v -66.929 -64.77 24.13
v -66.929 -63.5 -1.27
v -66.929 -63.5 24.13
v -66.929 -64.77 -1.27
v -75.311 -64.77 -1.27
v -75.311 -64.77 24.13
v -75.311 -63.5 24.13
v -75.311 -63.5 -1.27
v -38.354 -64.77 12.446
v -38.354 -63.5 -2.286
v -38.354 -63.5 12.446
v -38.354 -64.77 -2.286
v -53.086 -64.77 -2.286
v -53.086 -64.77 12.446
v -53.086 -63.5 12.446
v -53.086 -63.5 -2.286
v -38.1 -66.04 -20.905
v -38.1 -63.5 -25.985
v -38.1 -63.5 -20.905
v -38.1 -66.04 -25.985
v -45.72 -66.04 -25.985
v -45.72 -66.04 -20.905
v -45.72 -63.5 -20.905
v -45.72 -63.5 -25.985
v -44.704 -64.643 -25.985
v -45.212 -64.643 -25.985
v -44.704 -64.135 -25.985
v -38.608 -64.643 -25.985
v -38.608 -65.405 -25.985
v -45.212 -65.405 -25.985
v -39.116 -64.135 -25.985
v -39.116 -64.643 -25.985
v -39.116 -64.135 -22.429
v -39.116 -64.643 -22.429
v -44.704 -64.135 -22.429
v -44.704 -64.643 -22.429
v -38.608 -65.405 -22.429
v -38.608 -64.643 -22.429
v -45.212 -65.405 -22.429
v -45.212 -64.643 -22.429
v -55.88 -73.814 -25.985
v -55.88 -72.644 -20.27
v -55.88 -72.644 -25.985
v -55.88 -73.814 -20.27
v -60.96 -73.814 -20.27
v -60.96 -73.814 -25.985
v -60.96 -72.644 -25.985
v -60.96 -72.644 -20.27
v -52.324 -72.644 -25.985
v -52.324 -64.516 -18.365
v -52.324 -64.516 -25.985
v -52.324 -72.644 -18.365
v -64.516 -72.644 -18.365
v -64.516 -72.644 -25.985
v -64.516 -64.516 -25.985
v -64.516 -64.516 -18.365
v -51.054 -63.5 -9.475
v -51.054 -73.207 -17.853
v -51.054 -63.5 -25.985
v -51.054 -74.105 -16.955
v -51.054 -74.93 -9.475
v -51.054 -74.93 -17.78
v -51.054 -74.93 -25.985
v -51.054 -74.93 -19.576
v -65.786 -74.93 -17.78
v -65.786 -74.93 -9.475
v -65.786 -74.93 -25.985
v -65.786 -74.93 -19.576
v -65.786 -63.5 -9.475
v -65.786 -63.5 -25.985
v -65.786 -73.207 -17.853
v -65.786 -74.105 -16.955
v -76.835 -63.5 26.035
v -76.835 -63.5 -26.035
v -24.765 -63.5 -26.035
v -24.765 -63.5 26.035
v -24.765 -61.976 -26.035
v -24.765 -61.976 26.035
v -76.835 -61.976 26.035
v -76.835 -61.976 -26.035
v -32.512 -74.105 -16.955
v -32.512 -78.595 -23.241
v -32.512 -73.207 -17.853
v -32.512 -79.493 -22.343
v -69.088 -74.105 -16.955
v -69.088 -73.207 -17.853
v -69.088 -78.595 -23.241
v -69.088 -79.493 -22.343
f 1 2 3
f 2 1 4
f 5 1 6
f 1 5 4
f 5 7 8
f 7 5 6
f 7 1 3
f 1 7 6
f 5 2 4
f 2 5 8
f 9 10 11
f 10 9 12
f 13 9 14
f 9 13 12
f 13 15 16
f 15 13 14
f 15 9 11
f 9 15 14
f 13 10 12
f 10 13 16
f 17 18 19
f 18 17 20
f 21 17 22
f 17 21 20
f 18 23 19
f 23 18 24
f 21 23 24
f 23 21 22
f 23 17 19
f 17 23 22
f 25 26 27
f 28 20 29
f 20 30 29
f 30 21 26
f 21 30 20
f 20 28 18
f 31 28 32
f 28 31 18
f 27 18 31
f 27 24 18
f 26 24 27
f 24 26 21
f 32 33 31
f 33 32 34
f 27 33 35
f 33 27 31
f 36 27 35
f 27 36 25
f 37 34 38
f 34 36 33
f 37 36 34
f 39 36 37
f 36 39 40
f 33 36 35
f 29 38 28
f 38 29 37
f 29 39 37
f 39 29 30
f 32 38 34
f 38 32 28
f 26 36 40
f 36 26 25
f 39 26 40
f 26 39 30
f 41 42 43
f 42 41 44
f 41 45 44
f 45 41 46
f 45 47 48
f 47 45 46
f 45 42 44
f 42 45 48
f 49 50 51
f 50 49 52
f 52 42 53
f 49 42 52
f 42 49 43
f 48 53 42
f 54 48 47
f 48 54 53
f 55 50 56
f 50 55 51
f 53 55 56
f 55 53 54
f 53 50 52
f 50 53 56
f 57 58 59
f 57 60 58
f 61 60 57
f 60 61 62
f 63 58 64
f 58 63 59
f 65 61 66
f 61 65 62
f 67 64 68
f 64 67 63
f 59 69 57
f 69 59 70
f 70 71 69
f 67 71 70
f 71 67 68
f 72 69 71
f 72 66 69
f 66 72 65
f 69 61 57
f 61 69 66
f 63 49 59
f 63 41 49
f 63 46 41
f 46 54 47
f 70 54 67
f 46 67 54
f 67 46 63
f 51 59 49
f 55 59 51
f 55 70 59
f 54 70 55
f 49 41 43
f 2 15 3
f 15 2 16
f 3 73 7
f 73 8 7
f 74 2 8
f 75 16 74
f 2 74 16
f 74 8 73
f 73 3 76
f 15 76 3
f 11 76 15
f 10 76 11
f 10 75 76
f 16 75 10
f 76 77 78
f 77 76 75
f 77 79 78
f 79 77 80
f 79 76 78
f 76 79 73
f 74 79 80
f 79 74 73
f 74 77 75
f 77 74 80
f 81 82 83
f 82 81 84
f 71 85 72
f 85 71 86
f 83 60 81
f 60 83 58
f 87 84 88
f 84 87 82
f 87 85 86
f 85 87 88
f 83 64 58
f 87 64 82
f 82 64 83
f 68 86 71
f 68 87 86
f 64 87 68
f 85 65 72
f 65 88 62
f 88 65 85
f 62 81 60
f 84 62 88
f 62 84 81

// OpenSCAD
// file: ../mocad/moRJ45SocketSmall.scad
include <../mo/mo.scad>

moRJ45SocketSmall_Height = 0.65 * in;
moRJ45SocketSmall_Width = 0.58 * in;
moRJ45SocketSmall_Depth = 0.45 * in;
moRJ45SocketSmall_SideWall = 0.05 * in;
moRJ45SocketSmall_BottomWall = 0.05 * in;
moRJ45SocketSmall_TopWall = 0.08 * in;
moRJ45SocketSmall_BackWall = 0.35 * in;
moRJ45SocketSmall_TabHeight = 0.6 * in;
moRJ45SocketSmall_TabDepth = 0.05* in;
moRJ45SocketSmall_TabWidth = 0.2 * in;

positions = [ 
  [ [ 0, 0, 0 ], [ 0, 0, 1 ], 0 ],
  [ [ 0, -moRJ45SocketSmall_Height/2, -moRJ45SocketSmall_Depth/2 ], [ 1, 0, 0 ], 0 ]
];

module moRJ45SocketSmall( p = 0, info = false ) {
  moPresent( positions, p, info ) {
     color( Aluminum ) {
      difference() {
        cube( [ moRJ45SocketSmall_Width, moRJ45SocketSmall_Height, moRJ45SocketSmall_Depth ], center = true );
        translate( [ 0, -moRJ45SocketSmall_BackWall, -moRJ45SocketSmall_BottomWall/2 ] ) {
          translate( [ 0, -0.05*in, moRJ45SocketSmall_Depth / 2 - moRJ45SocketSmall_TopWall / 2 - Epsilon ] )
              cube( [ moRJ45SocketSmall_TabWidth, 
                      moRJ45SocketSmall_TabHeight, 
                      moRJ45SocketSmall_TabDepth ], center = true );
          cube( [ moRJ45SocketSmall_Width - 2 * moRJ45SocketSmall_SideWall, 
                  moRJ45SocketSmall_Height, 
                  moRJ45SocketSmall_Depth - moRJ45SocketSmall_TopWall - moRJ45SocketSmall_BottomWall ], center = true );
        }
        }
      }
    
  }
}


function moRJ45SocketSmallPosition( p = 0 ) = positions[ p ];

moMoveOriginTo( moRJ45SocketSmallPosition( 0 ) ) {
  moRJ45SocketSmall( 0, info = true, $name = true );
}
// file: ../mocad/moMicroUSB.scad
include <../mo/mo.scad>

moMicroUSB_Height = 0.2 * in;
moMicroUSB_Width = 0.3 * in;
moMicroUSB_Depth = 0.1 * in;
moMicroUSB_Wall = 0.02 * in;

positions = [ 
  [ [ 0, 0, 0 ], [ 0, 0, 1 ], 0 ],
  [ [ 0, -moMicroUSB_Height/2, -moMicroUSB_Depth/2 ], [ 1, 0, 0 ], 0 ]
];

module moMicroUSB( p = 0, info = false, name = false ) {
  moPresent( positions, p, info ) {
    // USB Connector
      color( Aluminum ) {
        difference() {
          cube( [ moMicroUSB_Width, moMicroUSB_Height, moMicroUSB_Depth ], center = true );
          translate( [ 0, -2 * moMicroUSB_Wall, -moMicroUSB_Wall/ 2] )
            cube( [ moMicroUSB_Width - 4 * moMicroUSB_Wall, 
                  moMicroUSB_Height - 2 * moMicroUSB_Wall, 
                  ( moMicroUSB_Depth - 2 * moMicroUSB_Wall ) / 2 ], center = true );
          translate( [ 0, -2 * moMicroUSB_Wall, moMicroUSB_Wall / 2 ] )
            cube( [ moMicroUSB_Width - 2 * moMicroUSB_Wall, 
                  moMicroUSB_Height - 2 * moMicroUSB_Wall, 
                  ( moMicroUSB_Depth - 2 * moMicroUSB_Wall ) / 2 ], center = true );
        
        }
      }
    
  }
}


function moMicroUSBPosition( p = 0 ) = positions[ p ];

moMoveOriginTo(moMicroUSBPosition( 1 ) ) {
  moMicroUSB( 1, info = true, $name = true );
}
// file: ../mocad/moPCB.scad
include <../mo/mo.scad>

PCBColor = [ 0, 0.3, 0 ];
PCBThickness = 0.06 * in;
PCBWidth = 1.5 * in;
PCBHeight = 1 * in;
PCBSpacing = 0.1 * in;
PCBMoldingLength = 0.45 * in;

module moPCB( width = PCBWidth, height = PCBHeight, color = PCBColor, thickness = PCBThickness, info = false ) {
  moPitch(-1)
  color( color ) {
    linear_extrude( height = thickness, twist = 0 ) {
      difference() {
        square( [ width, height ], center = true );
        children();
      }
    }
  }
  if ( info ) {
    moPartOrigin();
    for ( i = [ 0 : 5 ] )
      moMoveTo( moPCBPosition( i, width, height, thickness ) )
        moPosition( i );
  }
  if ( $name )
    moPartLabel( parent_module( 1 ) );
}

moPCBPositions = [
  [ [ 0, 0, 0 ], [ 0, 0, 1 ], 0 ],
  [ [ 0, 1, 0 ], [ 0, 0, 1 ], 180 ],
  [ [ 0.5, 0.5, 0 ], [ 0, 0, 1 ], 90 ],
  [ [ -0.5, 0.5, 0 ], [ 0, 0, 1 ], -90 ],
  [ [ 0, 0.5, 0.5 ], [ 1, 0, 0 ], -90 ],
  [ [ 0, 0.5, -0.5 ], [ 1, 0, 0 ], 90 ],
];

function vs( a, b ) = [ a[0]*b[0], a[1]*b[1], a[2]*b[2] ];

function moPCBPosition( p = 0, width = PCBWidth, height = PCBHeight, thickness = PCBThickness ) = [
  vs( moPCBPositions[ p ][ 0 ], [ width, thickness, height ] ),
  moPCBPositions[ p ][ 1 ], 
  moPCBPositions[ p ][ 2 ] 
];

module moPCBSIPMolding( x = 10, spacing = PCBSpacing, length = PCBMoldingLength, thickness = PCBSpacing/2, info = false ) {
  shift = length / 2;
  color( Black )
    translate( [ 0, length/2, 0 ] )
      cube( [ x * spacing, length, thickness ], center = true );
  if ( info ) {
    moPartOrigin();
    for ( i = [ 0 : 5 ] )
      moMoveTo( moPCBSIPMoldingPosition( i, x, spacing, length, thickness ) )
        moPosition( i );
  }
  if ( $name )
    moPartLabel( parent_module( 1 ) );
}

function moPCBSIPMoldingPosition( p = 0, x = 10, spacing = PCBSpacing, length = PCBMoldingLength, thickness = PCBSpacing / 2 ) = 
[
  vs( moPCBPositions[ p ][ 0 ], [ x * spacing, length, thickness ] ),
  moPCBPositions[ p ][ 1 ], 
  moPCBPositions[ p ][ 2 ] 
];

module moPCBPins( x = 10, spacing = 0.1 * in, diameter = 0.02 * in, length = 0.3 * in, ascent = 0.025 * in, info = false, center = true ) {
  shift = length / 2 - ascent;
  moPitch() {
    for ( xi = [ 0 : x - 1 ] ) {      
      translate( [ ( xi - (( center ) ? x / 2 - 0.5 : 0 ) ) * spacing, 0, 0  ] ) {
        translate( [ 0, 0, -shift ] ) {
          color( Copper )
            moYaw( 0.5 )
              cylinder( h = length, d = diameter, center = true, $fn = 4 );        
        }
      if ( info )
        moPitch( - 1 ) moPosition( xi );
      }
    }
  }
  if ( info )
    moPartOrigin();
  if ( $name )
    moPartLabel( parent_module( 1 ) );
}

function moPCBPinsPosition( x, xSize = 10, spacing = 0.1, center = true ) = [ ( x - (( center ) ? x / 2 - 0.5 : 0 ) ) * spacing, 0 ];

module moPCBHoles( x = 10, spacing = 0.1 * in, drill = 0.02 * in, info = false, center = true ) {
  for ( xi = [ 0 : x - 1 ] ) {      
    translate( [ ( xi - (( center ) ? x / 2 - 0.5 : 0 ) ) * spacing, 0 ] ) {
      circle( d = drill, center = true );        
      if ( info )
        moPitch( - 1 ) moPosition( xi );
    }
  }
  if ( info )
    moPartOrigin();
  if ( $name )
    moPartLabel( parent_module( 1 ) );
}

function moPCBHolesPosition( x, xSize = 10, spacing = 0.1, center = true ) = [ ( x - (( center ) ? x / 2 - 0.5 : 0 ) ) * spacing, 0 ];


module moPCBHoleGrid( x = 10, y = 10, spacing = 0.1 * in, drill = 0.02 * in, info = false, center = true ) {
  c = ( center ) ? [ x / 2 - 0.5, y / 2 - 0.5] : [ 0, 0 ];
  for ( yi = [ 0 : y - 1 ] ) {
    for ( xi = [ 0 : x - 1 ] ) {      
      translate( [ ( xi - c[ 0 ] ) * spacing, ( yi - c[ 1 ] ) * spacing  ], 0 ) {
        circle( d = drill, center = true );        
        if ( info )
          moPitch( - 1 ) moPosition2( [ xi, yi ] );
      }
    }
  }
  if ( info )
    moPartOrigin();
  if ( $name )
    moPartLabel( parent_module( 1 ) );
}

function moPCBHoleGrid( x, xSize = 10, ySize = 10, spacing = 0.1, center = true ) = 
  [ ( x - (( center ) ? x / 2 - 0.5 : 0 ) ) * spacing, ( y - (( center ) ? y / 2 - 0.5 : 0 ) ) * spacing ];


//moMoveOriginTo( moGridPosition( [ 2, 2, ] ) )

translate( [ -6 * in, 0, 0 ] ) {
  moPCB( 1.5 * in, 1 * in, info = true, $name = true )
    moPCBHoles( 10, 0.1 * in, 0.04 * in );
  moPCBPins( 10, 0.1 * in, length = 0.6 * in );
  moMoveTo( moPCBPosition( 1  ) )
    moFlip()
      moPCBSIPMolding( 10, length = 0.44 * in );
}
translate( [ -4 * in, 0, 0 ] )
   moPCBSIPMolding( 10, 0.1 * in, 0.5 * in, 0.05 * in, info = true, $name = true );
translate( [ -2 * in, 0, 0 ] )
   moPCBPins( 10, 0.1 * in, 0.02 * in, info = true, $name = true );
translate( [ 0 * in, 0, 0 ] )
  moPCBHoles( 10, info = true, $name = true );
translate( [ 2 * in, 0, 0 ] )
moPCBHoleGrid( 10, 10, info = true, $name = true );
// file: tpWR703N.scad
include <../mo/mo.scad>
use<../mocad/moPCB.scad>
use <../mocad/moMicroUSB.scad>
use <../mocad/moRJ45SocketSmall.scad>

$internalDetail = true;

WR703N_ComponentHeight = 0.03 * in;
WR703N_PCBDepth = 0.06 * in;
WR703N_Height = 2.05 * in;
WR703N_Width = 2.05 * in;
WR703N_Depth = WR703N_ComponentHeight + WR703N_PCBDepth;
WR703N_WireSpacing = 0.1 * in;

WR703N_PCBColor = [ 0, 0.2, 0 ];

WR703N_RAM_ChipHeight = 1.0 * in;
WR703N_RAM_ChipWidth = 0.33 * in;
WR703N_RAM_ChipDepth = 0.05 * in;
WR703N_RAM_ChipXOffset = -0.8 * in;
WR703N_RAM_ChipYOffset = 0.45 * in;

WR703N_CPU_ChipHeight = 0.58 * in;
WR703N_CPU_ChipWidth = 0.58 * in;
WR703N_CPU_ChipDepth = 0.05 * in;
WR703N_CPU_ChipXOffset = 0.2 * in;
WR703N_CPU_ChipYOffset = 0.2 * in;

WR703N_PushButtonHeight = 0.1 * in;
WR703N_PushButtonWidth = 0.165 * in;
WR703N_PushButtonDepth = 0.05 * in;

WR703N_PushButtonActuatorHeight = 0.06 * in;
WR703N_PushButtonActuatorWidth = 0.08 * in;
WR703N_PushButtonActuatorDepth = 0.03 * in;

WR703N_PCBSignals = 14;
WR703N_PCBSignalsWidth = 0.6 * in;
WR703N_PCBSignalSpacing = 0.1 * in;
WR703N_PCBSignalHoleDiameter = 0.03 * in;

WR703N_PushButtonOffset = WR703N_Height/2 - 0.168 * in;

WR703N_USBMicroConnectorYOffset = -(WR703N_Height)/2 + 0.05;
WR703N_USBMicroConnectorXOffset = (0.15 + 0.2)*in;
WR703N_USBMicroConnectorDepth = 0;

WR703N_RJ45ConnectorYOffset = -(WR703N_Height)/2 + 0.05;
WR703N_RJ45ConnectorXOffset = (-0.35 + 0.05)*in;

positions = [ 
  [ [ 0, 0, 0 ], [ 0, 0, 1 ], 0 ],
  [ [ 0, WR703N_PCBDepth, 0 ], [ 0, 0, 1 ], 180 ],

  [ [ -WR703N_Width/2, WR703N_PCBDepth / 2, 0 ], [0, 0, 1 ], -90 ], 
  [ [ +WR703N_Width/2, WR703N_PCBDepth / 2, 0 ], [0, 0, 1 ], 90 ], 
  [ [ 0, WR703N_PCBDepth / 2, WR703N_Height/2 ], [1, 0, 0 ], -90 ], 
  [ [ 0, WR703N_PCBDepth / 2, -WR703N_Height/2 ], [1, 0, 0 ], 90 ], 

  [ [ 0, -WR703N_USBMicroConnectorDepth/2, -WR703N_Height/2 ], [ 1, 0, 0 ], 90 ],
     
];

module tpWR703N( p = 0, info = false ) {
  moPresent( positions, p, info ) {
    difference() {
      moPCB( WR703N_Width, WR703N_Height, color = WR703N_PCBColor, thickness = WR703N_PCBDepth, $name = false );
    }

    moPitch() moPose( t = [ 0, 0, -WR703N_PCBDepth ] ) {
         union() {
           if ( $internalDetail ) {
            // RAM Chip
            translate( [ WR703N_RAM_ChipXOffset, WR703N_RAM_ChipYOffset, WR703N_PCBDepth + WR703N_RAM_ChipDepth / 2] ) {
              color( [ 0, 0, 0 ] ) {
                cube( [ WR703N_RAM_ChipWidth, WR703N_RAM_ChipHeight,WR703N_RAM_ChipDepth ], center = true );                
              }
            }
            // CPU Chip
            translate( [ WR703N_CPU_ChipXOffset, WR703N_CPU_ChipYOffset, WR703N_PCBDepth + WR703N_CPU_ChipDepth / 2] ) {
              color( [ 0, 0, 0 ]  ) {
                cube( [ WR703N_CPU_ChipWidth, WR703N_CPU_ChipHeight,WR703N_CPU_ChipDepth ], center = true );                
              }
            }
          }
          // USB Connector 1
          translate( [ WR703N_USBMicroConnectorXOffset, WR703N_USBMicroConnectorYOffset, WR703N_PCBDepth ] ) {
              moMicroUSB( 1, $name = false, info = false );
          }
          // Ethernet Connector
          translate( [ WR703N_RJ45ConnectorXOffset, WR703N_RJ45ConnectorYOffset, WR703N_PCBDepth ] ) {
              moRJ45SocketSmall( 1, $name = false, info = false );
          }
      }
    }
  }
}


function tpWR703NPosition( p = 0 ) = positions[ p ];

moMoveOriginTo( tpWR703NPosition( 1 ) ) {
  tpWR703N( 0, info = true, $name = true );
}
// main file
// All files referenced by the path up and then back down so they may be easily copied


use <../tplink/tpWR703N.scad>

include <../mo/mo.scad>

tpIndex( );

module tpIndex() {
  $name = true;

  moGridParts( [ 0, 0, 0], [ 0, 5 * in, 0 ], rotate = 0 ) {
    selectOther();
  }
}

module selectOther( ) {
  moGridParts( [ 0, 0, 0], [ 4 * in, 0, 0 ] ) {
    tpWR703N();
  }
}
